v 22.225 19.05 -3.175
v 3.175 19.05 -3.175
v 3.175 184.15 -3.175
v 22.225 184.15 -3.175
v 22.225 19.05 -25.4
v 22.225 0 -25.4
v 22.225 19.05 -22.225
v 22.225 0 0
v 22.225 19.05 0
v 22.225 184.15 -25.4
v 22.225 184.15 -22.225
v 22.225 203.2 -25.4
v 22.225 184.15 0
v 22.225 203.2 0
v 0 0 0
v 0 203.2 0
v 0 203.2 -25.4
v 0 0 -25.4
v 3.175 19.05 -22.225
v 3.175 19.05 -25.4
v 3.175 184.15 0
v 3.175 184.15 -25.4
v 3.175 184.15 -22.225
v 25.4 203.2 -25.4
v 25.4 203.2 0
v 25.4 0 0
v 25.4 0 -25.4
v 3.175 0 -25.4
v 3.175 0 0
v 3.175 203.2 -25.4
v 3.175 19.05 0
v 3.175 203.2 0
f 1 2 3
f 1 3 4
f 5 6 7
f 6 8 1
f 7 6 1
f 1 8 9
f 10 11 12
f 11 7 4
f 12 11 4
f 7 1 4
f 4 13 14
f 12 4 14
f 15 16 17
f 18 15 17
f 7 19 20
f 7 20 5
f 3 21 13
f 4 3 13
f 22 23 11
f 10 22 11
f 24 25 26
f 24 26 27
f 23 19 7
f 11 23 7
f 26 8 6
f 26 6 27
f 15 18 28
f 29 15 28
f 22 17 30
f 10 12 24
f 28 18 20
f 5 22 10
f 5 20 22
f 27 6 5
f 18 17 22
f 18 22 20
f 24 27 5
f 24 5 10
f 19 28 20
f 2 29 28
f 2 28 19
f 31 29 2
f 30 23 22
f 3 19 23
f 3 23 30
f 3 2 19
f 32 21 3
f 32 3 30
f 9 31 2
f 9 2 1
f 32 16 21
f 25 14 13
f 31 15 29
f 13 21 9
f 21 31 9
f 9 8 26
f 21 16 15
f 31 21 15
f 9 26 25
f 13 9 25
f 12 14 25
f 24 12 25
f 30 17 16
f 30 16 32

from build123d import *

# Parameters (mm, degrees)
SKETCH1_W           = 25.4
SKETCH1_H           = 25.4
SKETCH1_W_2         = 19.05
SKETCH1_H_2         = 19.05
EXTRUDE_THIN1_DEPTH = 203.2
SKETCH3_W           = 19.05
SKETCH3_H           = 19.05
CUT_EXTRUDE1_DEPTH  = 207.350575478
SKETCH4_W           = 19.05
SKETCH4_H           = 19.05
CUT_EXTRUDE2_DEPTH  = 207.350575478


with BuildPart() as part:
    # Sketch1 → Extrude-Thin1 (new body)
    with BuildSketch(Plane(origin=(0, 0, 0), x_dir=(1, 0, 0), z_dir=(0, 1, 0))):
        with Locations((12.7, 12.7)):
            Rectangle(SKETCH1_W, SKETCH1_H)
        with Locations((12.7, 12.7)):
            Rectangle(SKETCH1_W_2, SKETCH1_H_2, mode=Mode.SUBTRACT)
    extrude(amount=EXTRUDE_THIN1_DEPTH)

    # Sketch3 → Cut-Extrude1 (cut, through all)
    with BuildSketch(Plane.XY):
        with Locations((12.7, 193.675)):
            Rectangle(SKETCH3_W, SKETCH3_H)
    extrude(amount=-CUT_EXTRUDE1_DEPTH, mode=Mode.SUBTRACT)

    # Sketch4 → Cut-Extrude2 (cut, through all)
    with BuildSketch(Plane.XY):
        with Locations((12.7, 9.525)):
            Rectangle(SKETCH4_W, SKETCH4_H)
    extrude(amount=-CUT_EXTRUDE2_DEPTH, mode=Mode.SUBTRACT)


solid = part.part
